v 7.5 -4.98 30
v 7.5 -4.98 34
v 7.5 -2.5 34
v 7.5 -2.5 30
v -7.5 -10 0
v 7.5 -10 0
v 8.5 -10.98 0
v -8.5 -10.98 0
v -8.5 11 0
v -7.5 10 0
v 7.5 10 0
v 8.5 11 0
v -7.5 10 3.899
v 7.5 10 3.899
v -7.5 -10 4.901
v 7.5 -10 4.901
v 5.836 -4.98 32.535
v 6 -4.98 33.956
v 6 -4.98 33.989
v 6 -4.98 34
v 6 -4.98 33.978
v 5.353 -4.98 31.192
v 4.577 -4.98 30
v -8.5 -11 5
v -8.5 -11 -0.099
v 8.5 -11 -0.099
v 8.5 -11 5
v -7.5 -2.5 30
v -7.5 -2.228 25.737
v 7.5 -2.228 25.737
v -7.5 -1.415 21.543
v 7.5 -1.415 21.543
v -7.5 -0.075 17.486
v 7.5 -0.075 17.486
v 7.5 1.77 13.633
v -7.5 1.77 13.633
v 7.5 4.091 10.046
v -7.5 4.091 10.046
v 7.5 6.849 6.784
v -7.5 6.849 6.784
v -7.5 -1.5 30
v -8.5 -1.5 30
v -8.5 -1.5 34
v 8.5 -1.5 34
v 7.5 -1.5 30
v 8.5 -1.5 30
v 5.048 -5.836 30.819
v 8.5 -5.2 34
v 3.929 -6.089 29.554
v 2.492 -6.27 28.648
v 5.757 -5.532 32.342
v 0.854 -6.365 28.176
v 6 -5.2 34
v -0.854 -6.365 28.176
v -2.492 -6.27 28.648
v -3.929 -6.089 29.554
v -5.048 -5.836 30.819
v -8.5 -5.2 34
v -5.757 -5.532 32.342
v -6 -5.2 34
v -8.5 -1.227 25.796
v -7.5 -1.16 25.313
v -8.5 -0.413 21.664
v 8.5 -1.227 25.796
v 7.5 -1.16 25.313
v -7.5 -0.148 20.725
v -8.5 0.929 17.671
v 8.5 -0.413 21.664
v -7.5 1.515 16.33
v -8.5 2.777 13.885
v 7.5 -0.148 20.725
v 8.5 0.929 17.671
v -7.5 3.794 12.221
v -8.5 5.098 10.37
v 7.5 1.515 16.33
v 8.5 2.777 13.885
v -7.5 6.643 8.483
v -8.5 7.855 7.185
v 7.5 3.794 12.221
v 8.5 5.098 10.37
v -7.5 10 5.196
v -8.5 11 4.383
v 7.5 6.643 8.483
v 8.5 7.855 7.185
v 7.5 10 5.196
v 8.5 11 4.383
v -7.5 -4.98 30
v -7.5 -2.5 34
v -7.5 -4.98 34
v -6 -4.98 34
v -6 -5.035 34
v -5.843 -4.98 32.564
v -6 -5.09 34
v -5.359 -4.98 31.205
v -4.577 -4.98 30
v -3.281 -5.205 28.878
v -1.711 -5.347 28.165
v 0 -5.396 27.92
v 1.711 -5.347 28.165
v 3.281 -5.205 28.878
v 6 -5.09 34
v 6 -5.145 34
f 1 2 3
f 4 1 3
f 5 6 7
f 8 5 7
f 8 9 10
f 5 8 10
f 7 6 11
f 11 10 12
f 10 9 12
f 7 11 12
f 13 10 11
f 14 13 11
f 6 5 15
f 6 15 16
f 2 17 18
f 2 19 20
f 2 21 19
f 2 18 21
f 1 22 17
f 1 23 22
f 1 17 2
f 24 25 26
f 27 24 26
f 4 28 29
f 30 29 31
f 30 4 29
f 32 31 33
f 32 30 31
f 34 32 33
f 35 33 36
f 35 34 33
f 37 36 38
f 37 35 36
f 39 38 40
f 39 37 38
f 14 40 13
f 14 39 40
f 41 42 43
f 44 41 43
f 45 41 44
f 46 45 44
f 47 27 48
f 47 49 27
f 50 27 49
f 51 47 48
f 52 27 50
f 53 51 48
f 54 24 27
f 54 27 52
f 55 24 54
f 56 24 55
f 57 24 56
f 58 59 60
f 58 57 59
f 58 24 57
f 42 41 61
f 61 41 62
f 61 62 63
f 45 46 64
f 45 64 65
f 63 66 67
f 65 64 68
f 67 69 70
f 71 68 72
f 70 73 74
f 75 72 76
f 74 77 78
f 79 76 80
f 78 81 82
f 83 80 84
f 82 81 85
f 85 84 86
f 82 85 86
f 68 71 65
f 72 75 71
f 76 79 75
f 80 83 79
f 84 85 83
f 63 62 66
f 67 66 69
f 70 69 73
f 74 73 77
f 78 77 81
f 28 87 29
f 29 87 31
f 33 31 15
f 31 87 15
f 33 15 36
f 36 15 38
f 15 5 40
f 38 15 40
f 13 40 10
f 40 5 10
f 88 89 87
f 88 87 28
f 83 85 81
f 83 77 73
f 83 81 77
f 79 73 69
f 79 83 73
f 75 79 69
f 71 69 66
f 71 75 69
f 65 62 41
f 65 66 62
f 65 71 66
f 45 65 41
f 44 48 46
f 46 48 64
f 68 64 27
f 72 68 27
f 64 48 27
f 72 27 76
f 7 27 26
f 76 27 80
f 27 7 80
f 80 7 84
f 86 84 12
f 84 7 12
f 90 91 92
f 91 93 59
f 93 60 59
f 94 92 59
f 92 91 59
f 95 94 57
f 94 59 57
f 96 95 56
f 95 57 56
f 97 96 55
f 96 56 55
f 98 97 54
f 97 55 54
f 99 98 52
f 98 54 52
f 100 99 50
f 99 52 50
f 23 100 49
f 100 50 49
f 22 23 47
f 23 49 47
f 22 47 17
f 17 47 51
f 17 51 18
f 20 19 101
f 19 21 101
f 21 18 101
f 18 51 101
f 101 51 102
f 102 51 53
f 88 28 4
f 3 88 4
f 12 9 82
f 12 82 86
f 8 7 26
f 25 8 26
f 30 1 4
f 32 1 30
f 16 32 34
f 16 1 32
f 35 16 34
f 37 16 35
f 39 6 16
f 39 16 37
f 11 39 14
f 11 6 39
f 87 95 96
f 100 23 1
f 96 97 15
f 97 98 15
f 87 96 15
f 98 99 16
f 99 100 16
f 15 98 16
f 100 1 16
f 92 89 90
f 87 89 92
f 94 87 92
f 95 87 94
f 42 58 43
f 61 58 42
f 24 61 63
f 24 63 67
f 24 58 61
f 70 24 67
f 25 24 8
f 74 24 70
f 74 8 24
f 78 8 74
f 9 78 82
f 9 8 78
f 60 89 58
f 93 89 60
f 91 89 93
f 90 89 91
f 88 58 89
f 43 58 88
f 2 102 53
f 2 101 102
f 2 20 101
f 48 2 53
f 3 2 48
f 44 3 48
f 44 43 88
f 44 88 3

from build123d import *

# Parameters (mm, degrees)
SKETCH1_W           = 17
SKETCH1_H           = 22
SKETCH1_W_2         = 15
SKETCH1_H_2         = 20
BOSS_EXTRUDE1_DEPTH = 30
SKETCH2_R           = 32.5
CUT_EXTRUDE1_DEPTH  = 37.193922142
BOSS_EXTRUDE2_REACH = 38.194
CUT_EXTRUDE2_DEPTH  = 37.193922142
BOSS_EXTRUDE3_START = -17
BOSS_EXTRUDE3_DEPTH = 17
SKETCH6_W           = 17
SKETCH6_H           = 4.5
SKETCH6_W_2         = 15
SKETCH6_H_2         = 2.480196097
BOSS_EXTRUDE4_DEPTH = 4
CUT_EXTRUDE3_DEPTH  = 40.572717875
CUT_EXTRUDE4_REACH  = 41.807
SKETCH8_R           = 6


with BuildPart() as part:
    # Sketch1 → Boss-Extrude1 (new body)
    with BuildSketch(Plane.XY):
        Rectangle(SKETCH1_W, SKETCH1_H)
        Rectangle(SKETCH1_W_2, SKETCH1_H_2, mode=Mode.SUBTRACT)
    extrude(amount=BOSS_EXTRUDE1_DEPTH)

    # Sketch2 → Cut-Extrude1 (cut, through all)
    with BuildSketch(Plane(origin=(8.5, 0, 0), x_dir=(0, 0, -1), z_dir=(1, 0, 0))):
        with Locations((-30, 31)):
            Circle(SKETCH2_R)
    extrude(amount=-CUT_EXTRUDE1_DEPTH, mode=Mode.SUBTRACT)

    # Sketch3 → Boss-Extrude2 (add, up to next)
    with BuildSketch(Plane(origin=(8.5, 0, 0), x_dir=(0, 0, -1), z_dir=(1, 0, 0)), mode=Mode.PRIVATE) as boss_extrude2_sk1:
        with BuildLine():
            Line((-30, -1.5), (-30, -2.5))
            ThreePointArc((-30, -2.5), (-14.962546758, 1.064653), (-3.125290699, 11))
            Line((-3.125290699, 11), (-4.382623085, 11))
            ThreePointArc((-4.382623085, 11), (-15.747807186, 1.791696386), (-30, -1.5))
        make_face()
    boss_extrude2_tool1 = extrude(boss_extrude2_sk1.sketch, amount=-BOSS_EXTRUDE2_REACH, mode=Mode.PRIVATE) - part.part
    add(boss_extrude2_tool1.solids().sort_by_distance((8.5, 1.521408, 15.61592))[0])

    # Sketch4 → Cut-Extrude2 (cut, through all)
    with BuildSketch(Plane.ZY.offset(8.5)):
        Polygon((5, -11), (30, -6), (30, -11), align=None)
    extrude(amount=-CUT_EXTRUDE2_DEPTH, mode=Mode.SUBTRACT)

    # Sketch5 → Boss-Extrude3 (add)
    with BuildSketch(Plane.ZY.offset(8.5).offset(BOSS_EXTRUDE3_START)):
        Polygon((5, -11), (30, -6), (30, -4.980196097), (-0.099019514, -11), align=None)
    extrude(amount=BOSS_EXTRUDE3_DEPTH)

    # Sketch6 → Boss-Extrude4 (add)
    with BuildSketch(Plane.XY.offset(30)):
        with Locations((0, -3.75)):
            Rectangle(SKETCH6_W, SKETCH6_H)
        with Locations((0, -3.740098049)):
            Rectangle(SKETCH6_W_2, SKETCH6_H_2, mode=Mode.SUBTRACT)
    extrude(amount=BOSS_EXTRUDE4_DEPTH)

    # Sketch7 → Cut-Extrude3 (cut, through all)
    with BuildSketch(Plane.ZY.offset(8.5)):
        Polygon((24, -7.2), (34, -5.2), (34, -7.2), align=None)
    extrude(amount=-CUT_EXTRUDE3_DEPTH, mode=Mode.SUBTRACT)

    # Sketch8 → Cut-Extrude4 (cut, up to next)
    with BuildSketch(Plane(origin=(0, -11.538461538, 2.307692308), x_dir=(1, 0, 0), z_dir=(0, -0.9805806756909202, 0.19611613513818413)), mode=Mode.PRIVATE) as cut_extrude4_sk1:
        with Locations((0, 32.319939071)):
            Circle(SKETCH8_R)
    cut_extrude4_tool1 = extrude(cut_extrude4_sk1.sketch, amount=-CUT_EXTRUDE4_REACH, mode=Mode.PRIVATE) & part.part
    add(cut_extrude4_tool1.solids().sort_by_distance((0, -5.2, 34))[0], mode=Mode.SUBTRACT)


solid = part.part
